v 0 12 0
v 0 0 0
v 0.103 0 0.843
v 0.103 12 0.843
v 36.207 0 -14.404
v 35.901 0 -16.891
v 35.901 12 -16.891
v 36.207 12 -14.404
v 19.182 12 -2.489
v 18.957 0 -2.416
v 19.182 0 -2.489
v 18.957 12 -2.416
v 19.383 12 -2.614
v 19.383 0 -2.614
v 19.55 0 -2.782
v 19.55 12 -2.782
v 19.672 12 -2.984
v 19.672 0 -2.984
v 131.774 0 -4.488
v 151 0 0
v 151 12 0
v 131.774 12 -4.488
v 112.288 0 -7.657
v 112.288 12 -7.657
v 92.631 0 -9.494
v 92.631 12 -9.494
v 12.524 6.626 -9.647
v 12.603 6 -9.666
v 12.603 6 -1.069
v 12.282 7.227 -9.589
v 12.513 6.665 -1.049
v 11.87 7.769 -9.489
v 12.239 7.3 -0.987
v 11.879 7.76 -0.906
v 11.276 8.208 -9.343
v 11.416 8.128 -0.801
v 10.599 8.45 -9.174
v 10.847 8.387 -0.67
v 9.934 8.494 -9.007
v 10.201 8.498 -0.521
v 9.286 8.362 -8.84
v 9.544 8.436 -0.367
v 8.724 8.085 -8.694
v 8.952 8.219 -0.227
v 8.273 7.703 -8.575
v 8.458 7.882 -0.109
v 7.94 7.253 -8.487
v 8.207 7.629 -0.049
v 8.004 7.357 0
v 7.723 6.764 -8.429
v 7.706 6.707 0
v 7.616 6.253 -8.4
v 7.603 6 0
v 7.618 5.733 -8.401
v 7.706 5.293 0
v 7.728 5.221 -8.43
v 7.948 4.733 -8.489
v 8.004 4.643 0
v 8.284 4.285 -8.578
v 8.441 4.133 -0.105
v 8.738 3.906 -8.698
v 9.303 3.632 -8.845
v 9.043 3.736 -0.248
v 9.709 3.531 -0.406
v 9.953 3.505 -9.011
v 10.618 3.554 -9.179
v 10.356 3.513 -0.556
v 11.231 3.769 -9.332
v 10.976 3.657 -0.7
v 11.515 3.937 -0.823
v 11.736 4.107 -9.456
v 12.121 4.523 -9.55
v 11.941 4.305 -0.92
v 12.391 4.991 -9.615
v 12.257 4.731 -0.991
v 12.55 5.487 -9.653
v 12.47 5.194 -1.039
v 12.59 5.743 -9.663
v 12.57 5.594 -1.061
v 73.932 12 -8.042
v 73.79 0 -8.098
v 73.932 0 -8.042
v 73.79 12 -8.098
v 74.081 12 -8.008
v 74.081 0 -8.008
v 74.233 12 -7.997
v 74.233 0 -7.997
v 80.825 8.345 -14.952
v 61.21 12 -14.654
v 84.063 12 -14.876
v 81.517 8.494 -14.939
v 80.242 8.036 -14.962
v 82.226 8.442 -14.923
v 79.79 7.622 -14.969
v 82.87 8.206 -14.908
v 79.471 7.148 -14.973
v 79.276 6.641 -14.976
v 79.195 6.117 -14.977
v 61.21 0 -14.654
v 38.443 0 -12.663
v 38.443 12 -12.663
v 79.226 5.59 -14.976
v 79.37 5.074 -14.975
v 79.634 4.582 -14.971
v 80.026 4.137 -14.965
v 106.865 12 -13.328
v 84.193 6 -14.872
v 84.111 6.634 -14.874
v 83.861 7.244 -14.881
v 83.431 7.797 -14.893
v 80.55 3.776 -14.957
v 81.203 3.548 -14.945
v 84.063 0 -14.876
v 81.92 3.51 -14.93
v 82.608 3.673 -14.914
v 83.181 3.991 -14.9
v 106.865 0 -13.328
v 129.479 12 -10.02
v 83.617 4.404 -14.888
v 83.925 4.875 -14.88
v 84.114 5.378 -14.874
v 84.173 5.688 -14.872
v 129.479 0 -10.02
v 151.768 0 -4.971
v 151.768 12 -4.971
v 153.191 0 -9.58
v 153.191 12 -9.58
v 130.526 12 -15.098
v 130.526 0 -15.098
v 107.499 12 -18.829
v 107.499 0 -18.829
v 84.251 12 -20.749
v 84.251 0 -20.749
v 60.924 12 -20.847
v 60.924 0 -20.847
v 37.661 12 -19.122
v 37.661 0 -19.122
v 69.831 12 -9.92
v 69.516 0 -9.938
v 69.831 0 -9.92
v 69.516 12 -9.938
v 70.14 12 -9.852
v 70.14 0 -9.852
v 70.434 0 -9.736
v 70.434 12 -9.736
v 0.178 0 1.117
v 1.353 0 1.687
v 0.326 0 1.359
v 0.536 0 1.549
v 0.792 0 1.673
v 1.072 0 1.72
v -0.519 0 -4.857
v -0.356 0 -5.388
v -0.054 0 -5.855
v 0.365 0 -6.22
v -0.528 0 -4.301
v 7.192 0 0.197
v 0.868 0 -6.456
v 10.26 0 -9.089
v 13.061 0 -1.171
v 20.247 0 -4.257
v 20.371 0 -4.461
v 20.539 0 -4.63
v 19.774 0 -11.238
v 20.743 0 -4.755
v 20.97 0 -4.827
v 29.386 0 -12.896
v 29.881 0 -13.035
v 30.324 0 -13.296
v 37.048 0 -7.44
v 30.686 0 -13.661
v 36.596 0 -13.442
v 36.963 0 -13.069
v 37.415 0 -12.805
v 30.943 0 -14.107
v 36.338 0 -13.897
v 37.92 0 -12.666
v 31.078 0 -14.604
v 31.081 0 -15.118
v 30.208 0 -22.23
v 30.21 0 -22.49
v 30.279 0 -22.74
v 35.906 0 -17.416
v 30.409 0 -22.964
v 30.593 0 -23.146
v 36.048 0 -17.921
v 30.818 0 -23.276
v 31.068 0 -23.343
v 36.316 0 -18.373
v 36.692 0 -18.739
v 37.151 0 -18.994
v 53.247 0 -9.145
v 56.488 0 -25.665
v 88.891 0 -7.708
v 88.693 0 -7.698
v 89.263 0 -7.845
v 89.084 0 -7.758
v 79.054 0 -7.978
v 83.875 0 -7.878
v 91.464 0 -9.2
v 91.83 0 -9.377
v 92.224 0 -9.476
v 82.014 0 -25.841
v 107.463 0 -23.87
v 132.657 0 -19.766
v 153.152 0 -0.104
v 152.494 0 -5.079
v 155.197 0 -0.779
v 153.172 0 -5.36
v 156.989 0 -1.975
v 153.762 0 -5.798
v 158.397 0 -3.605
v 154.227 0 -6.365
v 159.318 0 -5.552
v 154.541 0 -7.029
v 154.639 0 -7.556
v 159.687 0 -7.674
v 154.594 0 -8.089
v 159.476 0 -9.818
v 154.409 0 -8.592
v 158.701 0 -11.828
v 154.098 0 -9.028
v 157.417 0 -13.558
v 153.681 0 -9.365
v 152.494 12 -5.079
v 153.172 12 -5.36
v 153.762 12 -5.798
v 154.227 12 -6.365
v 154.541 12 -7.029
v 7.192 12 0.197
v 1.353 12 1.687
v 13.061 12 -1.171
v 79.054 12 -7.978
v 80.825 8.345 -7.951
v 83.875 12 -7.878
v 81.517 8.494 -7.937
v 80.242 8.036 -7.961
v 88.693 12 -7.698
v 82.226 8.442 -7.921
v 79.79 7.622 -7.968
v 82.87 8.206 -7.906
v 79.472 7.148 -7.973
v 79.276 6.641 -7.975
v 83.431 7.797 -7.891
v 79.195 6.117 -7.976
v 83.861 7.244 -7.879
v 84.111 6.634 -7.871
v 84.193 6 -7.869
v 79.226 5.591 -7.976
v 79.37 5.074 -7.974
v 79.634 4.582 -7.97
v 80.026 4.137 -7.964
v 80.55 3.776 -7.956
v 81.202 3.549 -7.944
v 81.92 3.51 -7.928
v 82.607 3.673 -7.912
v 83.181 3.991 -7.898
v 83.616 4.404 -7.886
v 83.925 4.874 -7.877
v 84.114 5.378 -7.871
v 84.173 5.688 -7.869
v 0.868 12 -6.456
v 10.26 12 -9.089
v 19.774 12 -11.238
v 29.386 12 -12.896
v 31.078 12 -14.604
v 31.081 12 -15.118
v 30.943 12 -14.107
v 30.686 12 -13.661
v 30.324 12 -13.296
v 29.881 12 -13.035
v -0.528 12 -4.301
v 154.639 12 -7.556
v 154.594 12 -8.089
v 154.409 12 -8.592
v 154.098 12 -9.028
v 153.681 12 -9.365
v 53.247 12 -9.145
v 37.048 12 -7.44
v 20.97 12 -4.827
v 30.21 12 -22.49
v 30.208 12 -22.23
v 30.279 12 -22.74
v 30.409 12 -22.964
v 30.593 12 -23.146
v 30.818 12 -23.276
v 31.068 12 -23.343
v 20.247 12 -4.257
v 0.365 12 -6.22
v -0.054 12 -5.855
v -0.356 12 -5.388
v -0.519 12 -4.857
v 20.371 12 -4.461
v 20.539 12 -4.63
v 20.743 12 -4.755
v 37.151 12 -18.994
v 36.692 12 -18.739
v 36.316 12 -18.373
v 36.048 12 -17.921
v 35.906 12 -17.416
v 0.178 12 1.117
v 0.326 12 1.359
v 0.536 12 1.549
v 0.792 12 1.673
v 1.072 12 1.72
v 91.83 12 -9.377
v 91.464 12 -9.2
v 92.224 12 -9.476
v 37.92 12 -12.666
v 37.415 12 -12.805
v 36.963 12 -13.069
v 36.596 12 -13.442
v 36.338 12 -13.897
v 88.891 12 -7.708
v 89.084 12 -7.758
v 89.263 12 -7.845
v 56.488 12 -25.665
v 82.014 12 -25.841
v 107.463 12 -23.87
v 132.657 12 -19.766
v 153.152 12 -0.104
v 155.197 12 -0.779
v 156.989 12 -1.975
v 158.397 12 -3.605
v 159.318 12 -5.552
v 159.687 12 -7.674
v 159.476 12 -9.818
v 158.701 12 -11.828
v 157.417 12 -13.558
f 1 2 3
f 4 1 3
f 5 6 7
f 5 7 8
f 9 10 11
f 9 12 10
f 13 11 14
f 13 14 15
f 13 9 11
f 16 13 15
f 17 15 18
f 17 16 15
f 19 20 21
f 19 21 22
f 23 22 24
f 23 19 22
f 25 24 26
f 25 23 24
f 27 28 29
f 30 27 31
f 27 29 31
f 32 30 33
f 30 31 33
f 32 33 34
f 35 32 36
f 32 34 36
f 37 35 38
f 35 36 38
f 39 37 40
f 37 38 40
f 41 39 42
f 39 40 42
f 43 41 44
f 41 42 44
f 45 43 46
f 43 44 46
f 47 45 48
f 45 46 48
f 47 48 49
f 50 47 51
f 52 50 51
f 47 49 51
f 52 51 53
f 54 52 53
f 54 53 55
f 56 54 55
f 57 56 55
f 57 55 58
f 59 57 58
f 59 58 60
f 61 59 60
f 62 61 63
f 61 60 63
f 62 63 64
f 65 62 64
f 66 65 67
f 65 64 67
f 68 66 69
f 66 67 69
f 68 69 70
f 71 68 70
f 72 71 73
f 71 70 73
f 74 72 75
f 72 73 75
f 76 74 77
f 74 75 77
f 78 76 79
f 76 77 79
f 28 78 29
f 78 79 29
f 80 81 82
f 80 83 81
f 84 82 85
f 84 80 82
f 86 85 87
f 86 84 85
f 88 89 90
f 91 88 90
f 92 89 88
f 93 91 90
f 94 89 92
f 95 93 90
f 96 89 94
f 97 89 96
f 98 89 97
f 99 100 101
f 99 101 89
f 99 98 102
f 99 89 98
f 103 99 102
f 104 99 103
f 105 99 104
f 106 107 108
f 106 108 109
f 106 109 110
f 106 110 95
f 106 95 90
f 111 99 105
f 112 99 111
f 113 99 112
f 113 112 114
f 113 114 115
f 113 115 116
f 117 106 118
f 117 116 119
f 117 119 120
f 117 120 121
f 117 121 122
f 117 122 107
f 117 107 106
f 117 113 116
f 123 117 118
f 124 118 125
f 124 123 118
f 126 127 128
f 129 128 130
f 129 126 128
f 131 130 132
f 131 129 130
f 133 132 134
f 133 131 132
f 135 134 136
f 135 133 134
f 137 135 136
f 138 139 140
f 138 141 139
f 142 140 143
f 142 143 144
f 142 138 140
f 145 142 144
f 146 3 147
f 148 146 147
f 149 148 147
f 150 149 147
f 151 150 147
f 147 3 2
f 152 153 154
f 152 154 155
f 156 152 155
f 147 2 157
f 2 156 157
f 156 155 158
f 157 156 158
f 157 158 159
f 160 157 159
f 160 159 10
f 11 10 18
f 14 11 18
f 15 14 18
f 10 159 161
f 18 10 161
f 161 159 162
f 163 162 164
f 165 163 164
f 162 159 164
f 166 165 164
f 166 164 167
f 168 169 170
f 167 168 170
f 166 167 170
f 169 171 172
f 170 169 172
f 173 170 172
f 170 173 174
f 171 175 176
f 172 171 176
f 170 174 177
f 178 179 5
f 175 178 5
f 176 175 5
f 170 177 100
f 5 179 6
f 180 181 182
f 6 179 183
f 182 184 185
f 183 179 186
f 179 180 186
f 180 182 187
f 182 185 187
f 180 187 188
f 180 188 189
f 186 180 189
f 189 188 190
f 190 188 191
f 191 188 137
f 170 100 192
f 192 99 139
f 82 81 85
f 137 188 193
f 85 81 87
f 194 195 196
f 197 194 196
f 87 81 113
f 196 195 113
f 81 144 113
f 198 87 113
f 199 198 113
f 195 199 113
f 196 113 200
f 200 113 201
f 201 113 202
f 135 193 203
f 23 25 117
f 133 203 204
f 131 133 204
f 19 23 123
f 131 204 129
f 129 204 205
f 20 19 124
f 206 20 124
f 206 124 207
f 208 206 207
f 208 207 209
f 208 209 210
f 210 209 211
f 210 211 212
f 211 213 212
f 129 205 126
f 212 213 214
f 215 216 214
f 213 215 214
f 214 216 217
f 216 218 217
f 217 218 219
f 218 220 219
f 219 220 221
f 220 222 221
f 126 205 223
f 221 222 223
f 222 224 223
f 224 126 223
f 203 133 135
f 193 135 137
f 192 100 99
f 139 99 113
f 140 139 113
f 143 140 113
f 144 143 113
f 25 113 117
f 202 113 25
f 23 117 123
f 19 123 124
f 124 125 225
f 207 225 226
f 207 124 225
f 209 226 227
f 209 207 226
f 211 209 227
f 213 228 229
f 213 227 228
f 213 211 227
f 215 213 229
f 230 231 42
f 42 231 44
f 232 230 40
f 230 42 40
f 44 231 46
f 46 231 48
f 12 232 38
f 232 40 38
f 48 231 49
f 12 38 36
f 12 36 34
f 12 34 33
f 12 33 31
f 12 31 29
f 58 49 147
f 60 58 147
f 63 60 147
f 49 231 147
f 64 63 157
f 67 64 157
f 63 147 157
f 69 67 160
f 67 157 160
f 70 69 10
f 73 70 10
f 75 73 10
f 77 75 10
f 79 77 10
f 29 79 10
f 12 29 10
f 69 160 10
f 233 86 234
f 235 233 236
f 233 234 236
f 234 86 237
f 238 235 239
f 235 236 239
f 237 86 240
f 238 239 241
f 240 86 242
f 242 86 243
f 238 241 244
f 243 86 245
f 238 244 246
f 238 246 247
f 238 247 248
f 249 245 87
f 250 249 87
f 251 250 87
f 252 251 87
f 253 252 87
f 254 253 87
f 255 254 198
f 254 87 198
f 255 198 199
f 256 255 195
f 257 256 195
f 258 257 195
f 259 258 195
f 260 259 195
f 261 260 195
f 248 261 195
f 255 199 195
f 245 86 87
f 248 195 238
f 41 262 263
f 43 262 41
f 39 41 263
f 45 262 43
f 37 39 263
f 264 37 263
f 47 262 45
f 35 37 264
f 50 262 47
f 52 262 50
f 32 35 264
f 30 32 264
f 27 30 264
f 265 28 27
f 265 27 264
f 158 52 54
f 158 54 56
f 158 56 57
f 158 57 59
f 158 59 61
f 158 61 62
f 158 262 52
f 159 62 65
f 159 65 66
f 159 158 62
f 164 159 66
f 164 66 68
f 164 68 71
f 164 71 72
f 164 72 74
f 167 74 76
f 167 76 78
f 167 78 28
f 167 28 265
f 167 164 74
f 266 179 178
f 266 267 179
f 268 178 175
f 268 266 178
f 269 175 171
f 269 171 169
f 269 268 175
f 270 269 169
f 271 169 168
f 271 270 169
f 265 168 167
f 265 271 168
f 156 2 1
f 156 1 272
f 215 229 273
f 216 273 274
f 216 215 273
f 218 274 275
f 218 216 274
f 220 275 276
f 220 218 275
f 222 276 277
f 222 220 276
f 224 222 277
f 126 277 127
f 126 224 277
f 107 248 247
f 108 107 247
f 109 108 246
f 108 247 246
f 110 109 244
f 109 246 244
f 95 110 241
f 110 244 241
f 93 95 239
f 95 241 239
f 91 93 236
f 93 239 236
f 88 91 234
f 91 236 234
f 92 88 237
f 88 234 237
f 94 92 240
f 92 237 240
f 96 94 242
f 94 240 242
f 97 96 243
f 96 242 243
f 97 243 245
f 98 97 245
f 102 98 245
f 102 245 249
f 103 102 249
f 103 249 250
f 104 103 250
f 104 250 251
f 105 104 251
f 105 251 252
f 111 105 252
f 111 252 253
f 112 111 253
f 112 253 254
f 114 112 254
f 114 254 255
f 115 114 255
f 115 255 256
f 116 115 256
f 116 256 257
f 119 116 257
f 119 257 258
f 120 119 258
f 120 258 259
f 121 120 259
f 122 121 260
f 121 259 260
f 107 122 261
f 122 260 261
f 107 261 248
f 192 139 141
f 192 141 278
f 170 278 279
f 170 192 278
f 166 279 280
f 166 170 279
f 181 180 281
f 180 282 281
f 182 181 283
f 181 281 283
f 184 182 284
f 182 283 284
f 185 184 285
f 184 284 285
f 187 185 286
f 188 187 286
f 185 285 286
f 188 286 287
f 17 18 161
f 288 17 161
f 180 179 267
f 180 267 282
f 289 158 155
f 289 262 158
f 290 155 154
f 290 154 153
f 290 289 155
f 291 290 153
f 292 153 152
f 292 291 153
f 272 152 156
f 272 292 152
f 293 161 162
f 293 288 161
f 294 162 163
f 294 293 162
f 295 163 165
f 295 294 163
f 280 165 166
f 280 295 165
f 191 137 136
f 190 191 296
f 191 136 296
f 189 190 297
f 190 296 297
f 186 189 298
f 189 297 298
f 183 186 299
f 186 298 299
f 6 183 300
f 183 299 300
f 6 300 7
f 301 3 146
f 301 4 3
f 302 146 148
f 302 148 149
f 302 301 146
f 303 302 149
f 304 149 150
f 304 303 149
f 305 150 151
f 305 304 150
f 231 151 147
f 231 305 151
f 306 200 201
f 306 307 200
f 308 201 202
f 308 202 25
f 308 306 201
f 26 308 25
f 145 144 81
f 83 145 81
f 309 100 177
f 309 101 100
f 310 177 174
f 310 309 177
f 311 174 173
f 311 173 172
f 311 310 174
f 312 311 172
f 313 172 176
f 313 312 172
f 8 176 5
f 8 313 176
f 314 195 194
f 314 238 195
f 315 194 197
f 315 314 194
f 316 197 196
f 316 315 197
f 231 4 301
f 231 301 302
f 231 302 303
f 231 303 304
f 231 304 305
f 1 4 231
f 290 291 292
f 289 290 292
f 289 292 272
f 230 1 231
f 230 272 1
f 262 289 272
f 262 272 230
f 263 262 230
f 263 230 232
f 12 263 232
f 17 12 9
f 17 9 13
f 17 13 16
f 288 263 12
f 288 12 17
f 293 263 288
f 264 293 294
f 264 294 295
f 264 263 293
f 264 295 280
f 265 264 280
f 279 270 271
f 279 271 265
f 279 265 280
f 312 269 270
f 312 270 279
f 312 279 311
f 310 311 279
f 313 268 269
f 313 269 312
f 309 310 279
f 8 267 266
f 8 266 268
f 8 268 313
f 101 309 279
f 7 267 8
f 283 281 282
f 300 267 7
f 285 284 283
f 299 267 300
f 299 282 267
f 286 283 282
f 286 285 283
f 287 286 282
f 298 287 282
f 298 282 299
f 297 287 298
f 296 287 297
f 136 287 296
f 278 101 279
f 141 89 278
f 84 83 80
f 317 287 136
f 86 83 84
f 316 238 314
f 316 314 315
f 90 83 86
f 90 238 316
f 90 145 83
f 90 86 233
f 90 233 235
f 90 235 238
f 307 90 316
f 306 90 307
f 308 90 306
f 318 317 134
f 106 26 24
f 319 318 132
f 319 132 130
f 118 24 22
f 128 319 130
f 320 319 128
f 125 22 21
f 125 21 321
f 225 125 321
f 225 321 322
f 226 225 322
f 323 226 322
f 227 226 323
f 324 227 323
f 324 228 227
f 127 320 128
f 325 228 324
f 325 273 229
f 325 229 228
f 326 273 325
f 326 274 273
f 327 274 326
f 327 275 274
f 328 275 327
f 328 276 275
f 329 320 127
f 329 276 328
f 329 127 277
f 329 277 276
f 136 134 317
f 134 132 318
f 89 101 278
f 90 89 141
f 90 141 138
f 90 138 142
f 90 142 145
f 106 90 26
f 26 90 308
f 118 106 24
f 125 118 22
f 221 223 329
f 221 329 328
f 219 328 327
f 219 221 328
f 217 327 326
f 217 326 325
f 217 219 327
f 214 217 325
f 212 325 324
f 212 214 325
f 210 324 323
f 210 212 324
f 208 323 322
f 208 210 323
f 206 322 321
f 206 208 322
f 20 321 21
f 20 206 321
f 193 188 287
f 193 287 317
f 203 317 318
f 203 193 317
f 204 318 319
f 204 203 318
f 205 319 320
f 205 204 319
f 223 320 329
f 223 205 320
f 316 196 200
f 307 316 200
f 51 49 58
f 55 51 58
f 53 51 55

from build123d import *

# Parameters (mm, degrees)
BOSS_EXTRUDE1_DEPTH = 12
FILLET4_R           = 1
FILLET5_R           = 2
FILLET6_R           = 2
CUT_EXTRUDE3_DEPTH  = 33
FILLET8_R           = 2
BOSS_EXTRUDE2_DEPTH = 12
FILLET9_R           = 1
FILLET10_R          = 1
BOSS_EXTRUDE3_DEPTH = 12
FILLET11_R          = 2
FILLET12_R          = 1
FILLET13_R          = 2
SKETCH10_R          = 2.5
CUT_EXTRUDE4_DEPTH  = 18


with BuildPart() as part:
    # Sketch2 → Boss-Extrude1 (new body)
    with BuildSketch(Plane(origin=(0, 0, 0), x_dir=(1, 0, 0), z_dir=(0, 1, 0))):
        with BuildLine():
            Line((0, 0), (-0.73121606, 5.95527691))
            ThreePointArc((-0.73121606, 5.95527691), (15.138799382, 10.254914459), (31.320769044, 13.168354193))
            Line((31.320769044, 13.168354193), (30.087748344, 23.210501924))
            ThreePointArc((30.087748344, 23.210501924), (94.266191099, 25.160742626), (157.417218543, 13.557997867))
            ThreePointArc((157.417218543, 13.557997867), (158.923283556, 4.547467734), (151, 0))
            ThreePointArc((151, 0), (75.5, 10), (0, 0))
        make_face()
    extrude(amount=BOSS_EXTRUDE1_DEPTH)

    # Fillet4
    fillet4_edges = [part.edges().sort_by_distance(p)[0] for p in [
        (30.087748344, 6, -23.210501924),
    ]]
    fillet(fillet4_edges, radius=FILLET4_R)

    # Fillet5
    fillet5_edges = [part.edges().sort_by_distance(p)[0] for p in [
        (31.320769044, 6, -13.168354193),
    ]]
    fillet(fillet5_edges, radius=FILLET5_R)

    # Fillet6
    fillet6_edges = [part.edges().sort_by_distance(p)[0] for p in [
        (-0.73121606, 6, -5.95527691),
    ]]
    fillet(fillet6_edges, radius=FILLET6_R)

    # Sketch5 → Cut-Extrude3 (cut)
    with BuildSketch(Plane(origin=(0, 0, 0), x_dir=(1, 0, 0), z_dir=(0, 1, 0))):
        with BuildLine():
            Line((35.656168792, 18.886901985), (36.452121023, 12.404391276))
            ThreePointArc((36.452121023, 12.404391276), (94.477597701, 14.388970685), (151.768043541, 4.970939327))
            ThreePointArc((151.768043541, 4.970939327), (153.480302105, 5.560994433), (154.540953062, 7.028991016))
            ThreePointArc((154.540953062, 7.028991016), (154.409459032, 8.592099199), (153.190642938, 9.579563223))
            ThreePointArc((153.190642938, 9.579563223), (94.887793134, 20.097584909), (35.656168792, 18.886901985))
        make_face()
    extrude(amount=CUT_EXTRUDE3_DEPTH, mode=Mode.SUBTRACT)

    # Fillet8
    fillet8_edges = [part.edges().sort_by_distance(p)[0] for p in [
        (35.656168792, 6, -18.886901985),
        (36.452121023, 6, -12.404391276),
    ]]
    fillet(fillet8_edges, radius=FILLET8_R)

    # Sketch6 → Boss-Extrude2 (add)
    with BuildSketch(Plane(origin=(0, 0, 0), x_dir=(1, 0, 0), z_dir=(0, 1, 0))):
        with BuildLine():
            Line((0, 0), (0.243738687, -1.985092303))
            ThreePointArc((0.243738687, -1.985092303), (9.813572193, 0.430074334), (19.460534614, 2.515945677))
            Line((19.460534614, 2.515945677), (20.460534614, 4.729325881))
            ThreePointArc((20.460534614, 4.729325881), (10.187446562, 2.549918803), (0, 0))
        make_face()
    extrude(amount=BOSS_EXTRUDE2_DEPTH)

    # Fillet9
    fillet9_edges = [part.edges().sort_by_distance(p)[0] for p in [
        (0.243738687, 6, 1.985092303),
    ]]
    fillet(fillet9_edges, radius=FILLET9_R)

    # Fillet10
    fillet10_edges = [part.edges().sort_by_distance(p)[0] for p in [
        (20.460534614, 6, -4.729325881),
        (19.460534614, 6, -2.515945677),
    ]]
    fillet(fillet10_edges, radius=FILLET10_R)

    # Sketch7 → Boss-Extrude3 (add)
    with BuildSketch(Plane(origin=(0, 0, 0), x_dir=(1, 0, 0), z_dir=(0, 1, 0))):
        with BuildLine():
            Line((70, 9.947842385), (74, 7.996093893))
            ThreePointArc((74, 7.996093893), (81.502036249, 7.937453494), (89, 7.683433507))
            Line((89, 7.683433507), (92, 9.530243228))
            ThreePointArc((92, 9.530243228), (81.003961961, 9.947767207), (70, 9.947842385))
        make_face()
    extrude(amount=BOSS_EXTRUDE3_DEPTH)

    # Fillet11
    fillet11_edges = [part.edges().sort_by_distance(p)[0] for p in [
        (70, 6, -9.947842385),
    ]]
    fillet(fillet11_edges, radius=FILLET11_R)

    # Fillet12
    fillet12_edges = [part.edges().sort_by_distance(p)[0] for p in [
        (74, 6, -7.996093893),
        (89, 6, -7.683433507),
    ]]
    fillet(fillet12_edges, radius=FILLET12_R)

    # Fillet13
    fillet13_edges = [part.edges().sort_by_distance(p)[0] for p in [
        (92, 6, -9.530243228),
    ]]
    fillet(fillet13_edges, radius=FILLET13_R)

    # Sketch10 → Cut-Extrude4 (cut)
    with BuildSketch(Plane.XY):
        with Locations((81.692531177, 6)):
            Circle(SKETCH10_R)
        with Locations((10.103466275, 6)):
            Circle(SKETCH10_R)
    extrude(amount=-CUT_EXTRUDE4_DEPTH, mode=Mode.SUBTRACT)


solid = part.part
